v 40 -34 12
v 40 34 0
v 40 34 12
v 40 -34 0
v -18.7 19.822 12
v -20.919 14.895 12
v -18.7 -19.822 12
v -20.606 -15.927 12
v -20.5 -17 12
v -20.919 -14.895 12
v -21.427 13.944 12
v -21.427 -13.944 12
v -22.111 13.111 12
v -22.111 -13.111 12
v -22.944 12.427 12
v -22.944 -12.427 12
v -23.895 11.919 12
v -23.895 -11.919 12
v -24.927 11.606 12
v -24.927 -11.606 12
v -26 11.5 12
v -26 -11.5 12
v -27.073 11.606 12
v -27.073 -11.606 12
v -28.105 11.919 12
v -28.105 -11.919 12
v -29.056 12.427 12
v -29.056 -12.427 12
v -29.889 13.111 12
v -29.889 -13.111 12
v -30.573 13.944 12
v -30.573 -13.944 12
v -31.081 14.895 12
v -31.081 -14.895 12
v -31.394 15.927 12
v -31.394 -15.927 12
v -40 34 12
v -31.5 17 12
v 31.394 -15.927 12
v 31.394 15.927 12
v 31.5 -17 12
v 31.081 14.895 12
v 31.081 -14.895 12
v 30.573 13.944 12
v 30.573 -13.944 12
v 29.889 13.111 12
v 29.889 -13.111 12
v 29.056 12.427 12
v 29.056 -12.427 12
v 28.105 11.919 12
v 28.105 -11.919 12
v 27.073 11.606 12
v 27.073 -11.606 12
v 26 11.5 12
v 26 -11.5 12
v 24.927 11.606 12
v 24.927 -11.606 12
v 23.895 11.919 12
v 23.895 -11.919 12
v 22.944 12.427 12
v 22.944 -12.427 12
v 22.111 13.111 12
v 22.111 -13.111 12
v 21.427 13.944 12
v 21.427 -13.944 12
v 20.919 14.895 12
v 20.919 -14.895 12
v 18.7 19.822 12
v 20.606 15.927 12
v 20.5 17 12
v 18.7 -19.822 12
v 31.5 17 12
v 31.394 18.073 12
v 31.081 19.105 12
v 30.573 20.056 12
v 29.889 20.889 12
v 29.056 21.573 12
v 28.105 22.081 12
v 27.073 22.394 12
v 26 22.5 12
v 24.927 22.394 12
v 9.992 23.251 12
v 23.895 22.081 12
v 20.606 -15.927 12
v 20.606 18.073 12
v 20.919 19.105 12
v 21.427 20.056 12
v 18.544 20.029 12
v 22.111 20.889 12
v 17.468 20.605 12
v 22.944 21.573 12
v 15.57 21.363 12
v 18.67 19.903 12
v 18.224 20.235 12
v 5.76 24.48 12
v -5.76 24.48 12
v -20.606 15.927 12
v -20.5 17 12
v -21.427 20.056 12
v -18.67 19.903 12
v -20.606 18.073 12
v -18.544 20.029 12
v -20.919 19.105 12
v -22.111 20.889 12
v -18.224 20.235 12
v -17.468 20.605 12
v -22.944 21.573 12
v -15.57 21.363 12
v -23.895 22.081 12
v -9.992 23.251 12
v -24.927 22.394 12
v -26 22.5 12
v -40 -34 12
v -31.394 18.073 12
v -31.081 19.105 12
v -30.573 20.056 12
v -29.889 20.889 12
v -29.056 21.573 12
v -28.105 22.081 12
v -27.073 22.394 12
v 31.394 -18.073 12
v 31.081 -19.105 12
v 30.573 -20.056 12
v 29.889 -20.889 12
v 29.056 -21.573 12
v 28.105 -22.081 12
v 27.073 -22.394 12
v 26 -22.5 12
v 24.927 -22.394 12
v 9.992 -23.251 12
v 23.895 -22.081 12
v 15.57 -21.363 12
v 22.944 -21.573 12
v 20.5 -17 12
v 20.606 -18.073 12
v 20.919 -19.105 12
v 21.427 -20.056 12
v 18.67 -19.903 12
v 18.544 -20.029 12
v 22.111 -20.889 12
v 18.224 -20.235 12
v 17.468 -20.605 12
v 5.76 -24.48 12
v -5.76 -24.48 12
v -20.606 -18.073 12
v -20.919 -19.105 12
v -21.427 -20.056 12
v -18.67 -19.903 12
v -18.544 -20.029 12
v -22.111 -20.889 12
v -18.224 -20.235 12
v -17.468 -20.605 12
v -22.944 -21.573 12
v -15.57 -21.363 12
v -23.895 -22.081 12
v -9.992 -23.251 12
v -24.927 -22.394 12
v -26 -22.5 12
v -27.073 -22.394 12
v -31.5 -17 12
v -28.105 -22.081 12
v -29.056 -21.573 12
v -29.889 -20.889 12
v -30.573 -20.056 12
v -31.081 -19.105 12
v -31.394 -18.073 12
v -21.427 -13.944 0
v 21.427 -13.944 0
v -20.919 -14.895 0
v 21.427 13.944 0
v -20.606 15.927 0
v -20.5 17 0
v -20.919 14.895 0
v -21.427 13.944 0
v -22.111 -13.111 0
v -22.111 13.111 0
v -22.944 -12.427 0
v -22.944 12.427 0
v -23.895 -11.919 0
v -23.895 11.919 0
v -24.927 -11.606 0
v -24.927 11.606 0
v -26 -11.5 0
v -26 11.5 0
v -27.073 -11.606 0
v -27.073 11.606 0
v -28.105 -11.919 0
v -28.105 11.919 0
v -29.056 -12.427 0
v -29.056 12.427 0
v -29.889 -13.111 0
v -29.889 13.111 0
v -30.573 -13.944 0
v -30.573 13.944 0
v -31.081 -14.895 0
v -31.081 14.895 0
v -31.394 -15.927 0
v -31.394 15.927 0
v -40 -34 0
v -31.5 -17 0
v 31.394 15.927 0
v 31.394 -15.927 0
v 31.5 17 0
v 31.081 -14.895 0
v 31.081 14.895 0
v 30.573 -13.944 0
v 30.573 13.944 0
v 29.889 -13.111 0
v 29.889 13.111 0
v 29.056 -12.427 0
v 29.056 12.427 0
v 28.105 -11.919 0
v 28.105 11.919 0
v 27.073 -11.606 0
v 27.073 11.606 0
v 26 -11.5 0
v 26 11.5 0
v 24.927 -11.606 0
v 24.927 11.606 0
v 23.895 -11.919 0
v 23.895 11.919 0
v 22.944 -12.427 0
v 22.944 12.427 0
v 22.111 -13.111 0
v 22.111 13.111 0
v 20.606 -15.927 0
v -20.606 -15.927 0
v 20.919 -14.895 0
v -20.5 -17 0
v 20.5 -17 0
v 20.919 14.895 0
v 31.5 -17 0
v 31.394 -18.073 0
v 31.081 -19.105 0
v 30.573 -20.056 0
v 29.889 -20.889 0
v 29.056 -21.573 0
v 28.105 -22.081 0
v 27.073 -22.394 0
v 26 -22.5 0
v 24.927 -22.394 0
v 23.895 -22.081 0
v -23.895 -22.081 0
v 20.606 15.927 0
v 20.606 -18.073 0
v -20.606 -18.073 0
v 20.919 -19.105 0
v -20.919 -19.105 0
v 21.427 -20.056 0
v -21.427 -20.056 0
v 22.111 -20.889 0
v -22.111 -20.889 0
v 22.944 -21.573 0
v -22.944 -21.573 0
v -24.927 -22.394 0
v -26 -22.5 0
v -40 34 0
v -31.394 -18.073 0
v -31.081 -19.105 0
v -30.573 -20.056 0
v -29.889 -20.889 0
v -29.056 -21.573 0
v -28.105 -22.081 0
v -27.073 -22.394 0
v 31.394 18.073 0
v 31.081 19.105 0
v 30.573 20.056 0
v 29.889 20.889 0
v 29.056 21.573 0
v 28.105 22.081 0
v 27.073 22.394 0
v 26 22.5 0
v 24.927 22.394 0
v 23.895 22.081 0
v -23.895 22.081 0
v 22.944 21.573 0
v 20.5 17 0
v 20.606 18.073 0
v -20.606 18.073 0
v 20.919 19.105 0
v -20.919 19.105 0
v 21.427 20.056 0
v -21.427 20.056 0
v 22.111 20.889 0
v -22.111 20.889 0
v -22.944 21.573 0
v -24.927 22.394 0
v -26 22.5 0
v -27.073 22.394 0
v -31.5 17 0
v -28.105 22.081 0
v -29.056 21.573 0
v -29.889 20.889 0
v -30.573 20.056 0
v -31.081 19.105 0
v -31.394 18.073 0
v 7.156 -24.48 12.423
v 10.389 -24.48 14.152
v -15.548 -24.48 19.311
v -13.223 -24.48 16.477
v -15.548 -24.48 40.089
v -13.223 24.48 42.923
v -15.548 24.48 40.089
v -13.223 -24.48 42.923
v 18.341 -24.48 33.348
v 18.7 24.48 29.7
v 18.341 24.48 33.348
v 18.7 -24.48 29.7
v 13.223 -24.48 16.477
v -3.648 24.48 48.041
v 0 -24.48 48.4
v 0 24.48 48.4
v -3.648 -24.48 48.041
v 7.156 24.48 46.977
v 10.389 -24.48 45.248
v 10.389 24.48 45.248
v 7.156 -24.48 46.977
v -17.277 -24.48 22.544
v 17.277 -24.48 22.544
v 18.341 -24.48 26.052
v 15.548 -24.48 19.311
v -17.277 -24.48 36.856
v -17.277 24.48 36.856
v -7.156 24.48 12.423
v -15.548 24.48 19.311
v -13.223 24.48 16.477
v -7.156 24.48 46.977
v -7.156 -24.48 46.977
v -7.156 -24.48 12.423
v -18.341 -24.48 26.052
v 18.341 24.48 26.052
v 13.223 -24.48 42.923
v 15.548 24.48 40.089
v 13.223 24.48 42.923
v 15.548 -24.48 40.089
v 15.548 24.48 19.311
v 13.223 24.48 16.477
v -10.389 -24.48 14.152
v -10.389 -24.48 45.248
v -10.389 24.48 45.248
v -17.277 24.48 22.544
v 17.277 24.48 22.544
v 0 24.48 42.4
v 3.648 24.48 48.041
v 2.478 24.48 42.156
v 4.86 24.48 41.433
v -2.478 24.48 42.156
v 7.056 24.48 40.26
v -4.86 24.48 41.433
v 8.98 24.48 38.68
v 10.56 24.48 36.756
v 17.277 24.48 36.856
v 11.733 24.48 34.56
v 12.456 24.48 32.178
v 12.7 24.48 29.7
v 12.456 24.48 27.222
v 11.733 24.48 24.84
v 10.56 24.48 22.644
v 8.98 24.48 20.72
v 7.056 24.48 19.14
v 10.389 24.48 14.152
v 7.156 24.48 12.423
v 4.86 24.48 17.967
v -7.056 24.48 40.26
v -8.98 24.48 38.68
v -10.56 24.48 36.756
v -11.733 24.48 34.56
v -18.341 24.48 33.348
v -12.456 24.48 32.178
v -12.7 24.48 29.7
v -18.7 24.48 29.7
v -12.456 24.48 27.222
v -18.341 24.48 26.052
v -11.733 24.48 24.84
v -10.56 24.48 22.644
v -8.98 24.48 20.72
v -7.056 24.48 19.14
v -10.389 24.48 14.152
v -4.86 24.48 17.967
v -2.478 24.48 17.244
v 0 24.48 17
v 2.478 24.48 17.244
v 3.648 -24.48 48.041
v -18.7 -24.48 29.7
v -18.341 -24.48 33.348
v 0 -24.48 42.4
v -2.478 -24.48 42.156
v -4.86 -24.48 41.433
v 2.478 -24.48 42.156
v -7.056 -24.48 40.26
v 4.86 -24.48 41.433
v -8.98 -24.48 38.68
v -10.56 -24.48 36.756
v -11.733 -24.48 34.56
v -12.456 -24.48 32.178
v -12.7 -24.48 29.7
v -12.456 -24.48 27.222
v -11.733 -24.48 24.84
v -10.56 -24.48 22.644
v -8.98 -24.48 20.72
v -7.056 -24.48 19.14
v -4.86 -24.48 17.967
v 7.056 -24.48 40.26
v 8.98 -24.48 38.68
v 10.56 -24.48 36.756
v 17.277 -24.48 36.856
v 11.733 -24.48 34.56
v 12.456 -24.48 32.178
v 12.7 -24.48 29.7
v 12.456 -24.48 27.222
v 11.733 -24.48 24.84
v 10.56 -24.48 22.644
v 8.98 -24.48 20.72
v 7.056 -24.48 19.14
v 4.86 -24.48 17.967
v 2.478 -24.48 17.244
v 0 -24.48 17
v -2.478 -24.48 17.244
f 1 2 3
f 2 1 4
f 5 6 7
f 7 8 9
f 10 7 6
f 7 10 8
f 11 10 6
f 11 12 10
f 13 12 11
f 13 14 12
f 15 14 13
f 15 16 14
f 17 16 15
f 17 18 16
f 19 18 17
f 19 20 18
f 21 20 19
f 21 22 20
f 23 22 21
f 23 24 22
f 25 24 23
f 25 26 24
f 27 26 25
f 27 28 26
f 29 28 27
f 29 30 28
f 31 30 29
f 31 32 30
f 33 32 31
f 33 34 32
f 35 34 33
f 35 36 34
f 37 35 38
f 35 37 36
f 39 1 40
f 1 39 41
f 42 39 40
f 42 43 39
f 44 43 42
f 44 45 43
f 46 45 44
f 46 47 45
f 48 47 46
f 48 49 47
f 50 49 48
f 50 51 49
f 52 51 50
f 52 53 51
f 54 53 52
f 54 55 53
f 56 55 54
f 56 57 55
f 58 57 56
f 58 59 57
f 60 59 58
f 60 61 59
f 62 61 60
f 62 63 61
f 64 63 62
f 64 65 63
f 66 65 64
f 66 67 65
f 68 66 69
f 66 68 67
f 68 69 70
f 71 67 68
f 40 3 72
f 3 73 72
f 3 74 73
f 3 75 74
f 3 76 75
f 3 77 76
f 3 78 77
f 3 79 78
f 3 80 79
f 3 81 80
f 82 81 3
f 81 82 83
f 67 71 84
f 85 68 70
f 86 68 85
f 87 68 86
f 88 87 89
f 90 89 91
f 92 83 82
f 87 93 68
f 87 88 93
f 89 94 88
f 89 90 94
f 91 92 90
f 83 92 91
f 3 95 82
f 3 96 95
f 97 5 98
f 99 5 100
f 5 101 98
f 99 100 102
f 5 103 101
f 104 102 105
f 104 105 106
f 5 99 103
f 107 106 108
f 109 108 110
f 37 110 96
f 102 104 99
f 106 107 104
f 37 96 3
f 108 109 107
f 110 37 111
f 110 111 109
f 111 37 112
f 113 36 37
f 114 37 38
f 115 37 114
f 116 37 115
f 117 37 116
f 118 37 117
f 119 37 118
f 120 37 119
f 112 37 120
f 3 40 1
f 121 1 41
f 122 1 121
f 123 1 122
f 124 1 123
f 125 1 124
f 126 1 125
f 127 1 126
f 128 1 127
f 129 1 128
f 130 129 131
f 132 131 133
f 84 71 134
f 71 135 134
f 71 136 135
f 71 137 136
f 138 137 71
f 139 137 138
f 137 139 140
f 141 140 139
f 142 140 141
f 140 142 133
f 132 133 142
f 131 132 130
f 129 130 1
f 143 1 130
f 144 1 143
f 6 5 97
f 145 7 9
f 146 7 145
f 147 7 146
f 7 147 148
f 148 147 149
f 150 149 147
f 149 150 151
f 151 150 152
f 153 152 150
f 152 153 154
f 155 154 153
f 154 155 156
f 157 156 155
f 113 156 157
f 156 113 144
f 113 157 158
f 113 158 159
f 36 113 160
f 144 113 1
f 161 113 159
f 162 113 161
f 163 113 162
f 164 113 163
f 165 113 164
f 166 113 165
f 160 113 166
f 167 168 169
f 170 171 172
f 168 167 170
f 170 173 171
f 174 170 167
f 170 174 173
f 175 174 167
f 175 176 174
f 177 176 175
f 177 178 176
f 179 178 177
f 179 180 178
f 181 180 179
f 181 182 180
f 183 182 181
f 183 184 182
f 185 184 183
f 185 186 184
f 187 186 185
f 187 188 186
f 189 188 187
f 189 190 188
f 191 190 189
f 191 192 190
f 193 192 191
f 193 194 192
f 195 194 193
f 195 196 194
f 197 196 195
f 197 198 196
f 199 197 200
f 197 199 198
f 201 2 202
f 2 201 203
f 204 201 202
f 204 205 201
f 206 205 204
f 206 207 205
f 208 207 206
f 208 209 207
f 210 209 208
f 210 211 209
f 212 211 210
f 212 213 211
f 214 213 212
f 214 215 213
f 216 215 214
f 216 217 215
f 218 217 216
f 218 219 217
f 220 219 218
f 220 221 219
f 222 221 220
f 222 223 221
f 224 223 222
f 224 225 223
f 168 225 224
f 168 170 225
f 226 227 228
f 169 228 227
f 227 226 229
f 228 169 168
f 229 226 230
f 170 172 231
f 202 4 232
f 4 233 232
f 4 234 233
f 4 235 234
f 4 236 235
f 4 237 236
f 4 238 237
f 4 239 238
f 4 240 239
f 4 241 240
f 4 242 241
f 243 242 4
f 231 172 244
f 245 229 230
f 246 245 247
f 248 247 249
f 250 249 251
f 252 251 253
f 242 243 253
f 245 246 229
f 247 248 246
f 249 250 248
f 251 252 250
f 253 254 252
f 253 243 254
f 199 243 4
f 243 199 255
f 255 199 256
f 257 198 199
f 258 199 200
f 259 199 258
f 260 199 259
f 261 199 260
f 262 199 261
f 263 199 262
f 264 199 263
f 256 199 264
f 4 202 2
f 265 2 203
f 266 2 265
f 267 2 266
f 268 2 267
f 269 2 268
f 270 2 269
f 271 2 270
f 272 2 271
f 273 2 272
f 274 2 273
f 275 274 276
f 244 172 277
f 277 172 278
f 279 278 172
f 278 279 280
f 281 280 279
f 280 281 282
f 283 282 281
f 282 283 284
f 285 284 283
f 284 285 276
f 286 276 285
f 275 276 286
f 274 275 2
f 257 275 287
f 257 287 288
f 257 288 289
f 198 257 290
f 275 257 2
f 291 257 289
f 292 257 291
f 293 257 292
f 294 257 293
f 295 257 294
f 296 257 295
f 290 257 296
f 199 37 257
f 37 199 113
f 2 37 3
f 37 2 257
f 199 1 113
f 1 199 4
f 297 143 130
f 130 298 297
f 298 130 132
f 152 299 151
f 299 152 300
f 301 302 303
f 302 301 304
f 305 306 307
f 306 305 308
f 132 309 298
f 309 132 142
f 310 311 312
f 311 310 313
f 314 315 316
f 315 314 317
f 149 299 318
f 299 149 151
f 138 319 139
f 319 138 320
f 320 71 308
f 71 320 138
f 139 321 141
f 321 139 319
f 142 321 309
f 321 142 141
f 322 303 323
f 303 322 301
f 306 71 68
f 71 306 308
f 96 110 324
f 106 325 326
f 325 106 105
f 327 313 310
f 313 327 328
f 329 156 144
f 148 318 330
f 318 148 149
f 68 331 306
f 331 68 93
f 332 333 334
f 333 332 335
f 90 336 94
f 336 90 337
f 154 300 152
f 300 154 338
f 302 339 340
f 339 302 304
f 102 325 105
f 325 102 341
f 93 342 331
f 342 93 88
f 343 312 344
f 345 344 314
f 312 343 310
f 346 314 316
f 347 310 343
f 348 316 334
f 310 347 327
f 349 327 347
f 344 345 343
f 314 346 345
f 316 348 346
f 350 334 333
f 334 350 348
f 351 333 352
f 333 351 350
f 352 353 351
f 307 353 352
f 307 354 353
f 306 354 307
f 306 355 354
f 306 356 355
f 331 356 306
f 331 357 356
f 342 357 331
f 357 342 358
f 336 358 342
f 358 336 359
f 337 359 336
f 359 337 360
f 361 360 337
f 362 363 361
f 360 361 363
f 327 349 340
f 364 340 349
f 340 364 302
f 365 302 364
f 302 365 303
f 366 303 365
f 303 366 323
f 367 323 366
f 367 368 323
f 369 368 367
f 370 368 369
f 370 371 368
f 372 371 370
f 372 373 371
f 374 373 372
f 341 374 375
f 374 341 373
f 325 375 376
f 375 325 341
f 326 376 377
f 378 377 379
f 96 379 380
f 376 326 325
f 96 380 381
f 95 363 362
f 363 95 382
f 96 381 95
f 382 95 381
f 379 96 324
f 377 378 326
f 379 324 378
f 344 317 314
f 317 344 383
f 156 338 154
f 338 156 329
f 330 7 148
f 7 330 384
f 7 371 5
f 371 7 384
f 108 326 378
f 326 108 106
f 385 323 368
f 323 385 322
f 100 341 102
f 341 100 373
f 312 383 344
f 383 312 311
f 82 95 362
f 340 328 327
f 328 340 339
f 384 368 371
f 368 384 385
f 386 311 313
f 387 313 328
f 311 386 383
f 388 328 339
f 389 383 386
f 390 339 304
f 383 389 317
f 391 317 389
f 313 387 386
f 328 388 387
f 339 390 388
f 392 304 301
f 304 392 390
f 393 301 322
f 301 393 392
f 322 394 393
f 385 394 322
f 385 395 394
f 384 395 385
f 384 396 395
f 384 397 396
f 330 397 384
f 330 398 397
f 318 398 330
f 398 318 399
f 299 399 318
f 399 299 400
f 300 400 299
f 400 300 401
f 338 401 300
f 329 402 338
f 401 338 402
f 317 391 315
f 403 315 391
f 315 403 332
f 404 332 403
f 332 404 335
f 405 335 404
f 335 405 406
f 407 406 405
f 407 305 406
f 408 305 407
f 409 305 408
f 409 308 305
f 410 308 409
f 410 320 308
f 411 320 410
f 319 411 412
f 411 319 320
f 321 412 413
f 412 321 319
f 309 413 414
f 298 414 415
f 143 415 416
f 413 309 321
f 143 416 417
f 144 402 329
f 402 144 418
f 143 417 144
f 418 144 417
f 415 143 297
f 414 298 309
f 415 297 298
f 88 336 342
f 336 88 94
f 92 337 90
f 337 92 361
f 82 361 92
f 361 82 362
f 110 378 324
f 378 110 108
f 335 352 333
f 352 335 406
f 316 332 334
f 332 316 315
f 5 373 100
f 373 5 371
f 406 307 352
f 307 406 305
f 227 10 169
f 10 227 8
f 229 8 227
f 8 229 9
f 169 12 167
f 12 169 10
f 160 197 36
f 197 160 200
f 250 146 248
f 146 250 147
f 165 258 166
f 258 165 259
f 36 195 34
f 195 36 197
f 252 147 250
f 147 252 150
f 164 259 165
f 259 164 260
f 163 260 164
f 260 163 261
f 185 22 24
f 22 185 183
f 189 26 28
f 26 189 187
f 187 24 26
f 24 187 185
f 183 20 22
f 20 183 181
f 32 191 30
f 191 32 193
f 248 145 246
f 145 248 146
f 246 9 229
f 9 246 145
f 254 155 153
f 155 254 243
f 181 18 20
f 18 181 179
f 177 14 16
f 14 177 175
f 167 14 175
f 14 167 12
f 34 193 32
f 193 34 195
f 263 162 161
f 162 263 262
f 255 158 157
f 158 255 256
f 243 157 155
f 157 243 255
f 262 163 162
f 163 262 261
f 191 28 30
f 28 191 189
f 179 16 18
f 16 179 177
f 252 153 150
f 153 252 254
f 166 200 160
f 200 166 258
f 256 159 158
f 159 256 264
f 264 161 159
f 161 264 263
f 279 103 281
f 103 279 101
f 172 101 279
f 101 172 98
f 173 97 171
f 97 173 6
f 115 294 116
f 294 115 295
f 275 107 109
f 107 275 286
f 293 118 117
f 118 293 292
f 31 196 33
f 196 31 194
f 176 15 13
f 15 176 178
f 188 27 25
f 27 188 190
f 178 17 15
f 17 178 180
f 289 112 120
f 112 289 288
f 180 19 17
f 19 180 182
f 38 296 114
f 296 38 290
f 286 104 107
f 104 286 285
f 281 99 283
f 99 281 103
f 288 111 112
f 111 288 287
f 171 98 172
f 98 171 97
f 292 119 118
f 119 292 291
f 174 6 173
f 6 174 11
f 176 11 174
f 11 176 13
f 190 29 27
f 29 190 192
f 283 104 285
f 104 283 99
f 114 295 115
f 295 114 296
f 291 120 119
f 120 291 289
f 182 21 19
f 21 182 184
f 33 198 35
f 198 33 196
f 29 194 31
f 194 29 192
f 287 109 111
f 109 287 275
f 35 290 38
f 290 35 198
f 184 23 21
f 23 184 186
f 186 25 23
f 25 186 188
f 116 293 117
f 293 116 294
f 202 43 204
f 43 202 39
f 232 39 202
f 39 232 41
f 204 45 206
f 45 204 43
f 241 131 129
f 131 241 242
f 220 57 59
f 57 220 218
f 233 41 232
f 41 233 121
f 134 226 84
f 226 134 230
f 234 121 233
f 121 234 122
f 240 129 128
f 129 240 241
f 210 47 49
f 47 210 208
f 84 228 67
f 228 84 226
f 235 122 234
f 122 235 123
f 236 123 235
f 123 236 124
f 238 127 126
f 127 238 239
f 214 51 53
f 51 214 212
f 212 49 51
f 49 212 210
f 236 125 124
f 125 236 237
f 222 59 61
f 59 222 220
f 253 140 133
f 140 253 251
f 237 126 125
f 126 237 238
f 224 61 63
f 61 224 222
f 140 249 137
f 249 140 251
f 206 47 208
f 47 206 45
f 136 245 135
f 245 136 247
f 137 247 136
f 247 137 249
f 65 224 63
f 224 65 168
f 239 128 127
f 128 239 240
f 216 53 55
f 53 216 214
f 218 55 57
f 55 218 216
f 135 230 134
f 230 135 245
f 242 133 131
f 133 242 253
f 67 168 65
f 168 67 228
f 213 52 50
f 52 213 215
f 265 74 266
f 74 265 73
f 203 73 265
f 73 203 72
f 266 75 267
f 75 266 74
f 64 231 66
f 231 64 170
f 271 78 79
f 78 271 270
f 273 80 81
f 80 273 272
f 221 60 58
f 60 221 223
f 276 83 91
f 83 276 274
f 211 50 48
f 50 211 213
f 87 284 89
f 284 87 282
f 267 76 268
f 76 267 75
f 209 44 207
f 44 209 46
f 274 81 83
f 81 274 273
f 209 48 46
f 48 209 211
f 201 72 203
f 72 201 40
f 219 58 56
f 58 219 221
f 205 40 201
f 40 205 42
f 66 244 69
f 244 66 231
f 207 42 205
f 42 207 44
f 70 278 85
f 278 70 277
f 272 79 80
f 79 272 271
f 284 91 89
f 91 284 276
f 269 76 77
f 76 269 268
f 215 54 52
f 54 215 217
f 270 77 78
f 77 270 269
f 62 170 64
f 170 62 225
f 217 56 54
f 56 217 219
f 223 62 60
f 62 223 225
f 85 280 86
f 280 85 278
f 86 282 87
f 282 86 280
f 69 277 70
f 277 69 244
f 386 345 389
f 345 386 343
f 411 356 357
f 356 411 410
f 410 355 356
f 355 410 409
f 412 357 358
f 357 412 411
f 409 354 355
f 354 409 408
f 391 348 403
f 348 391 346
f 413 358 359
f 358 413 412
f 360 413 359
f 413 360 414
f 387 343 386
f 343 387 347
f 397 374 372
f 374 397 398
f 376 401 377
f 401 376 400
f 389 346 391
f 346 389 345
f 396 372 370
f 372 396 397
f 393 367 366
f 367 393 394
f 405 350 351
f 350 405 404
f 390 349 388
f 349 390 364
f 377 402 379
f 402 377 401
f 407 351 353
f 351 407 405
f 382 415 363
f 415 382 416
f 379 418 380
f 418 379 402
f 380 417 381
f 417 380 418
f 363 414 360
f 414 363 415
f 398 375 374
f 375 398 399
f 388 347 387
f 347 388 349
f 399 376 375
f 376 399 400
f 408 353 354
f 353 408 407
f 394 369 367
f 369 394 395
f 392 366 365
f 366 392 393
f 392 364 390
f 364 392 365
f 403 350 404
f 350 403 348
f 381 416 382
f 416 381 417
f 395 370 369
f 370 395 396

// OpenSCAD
$fn = 32;

// ----------------------------------------------------------------------
// Bearing block: 80 x 68 mm base, 25.4 mm bore at 29.7 mm
// ----------------------------------------------------------------------

// --- parameters (mm) ---
base_w = 80;              // base width
base_d = 68;              // base depth
base_t = 12;              // base thickness
bore_d = 25.4;            // shaft / bearing bore
house_r = 18.7;           // housing outer radius
house_len = 48.96;        // housing length along the shaft
foot_w = 37.4;            // foot width under the housing
foot_len = 38.96;         // foot length along the shaft
axis_z = 29.7;            // bore axis height above the base
holes_d = 11;             // mounting holes
hole_x = 26;              // mounting hole spacing

difference() {
  union() {
    /* base plate with its underside on z = 0 */
    translate([0, 0, base_t / 2]) cube([base_w, base_d, base_t], center = true);
    /* hull foot: a straight web blending into the round housing */
    hull() {
      translate([0, 0, base_t - 0.5]) cube([foot_w, foot_len, 1.6], center = true);
      translate([0, 0, axis_z]) rotate([-90, 0, 0]) cylinder(h = house_len, d = 2 * house_r, center = true);
    }
  }
  /* bore through the housing, 2.5 mm clear on both sides */
  translate([0, 0, axis_z]) rotate([-90, 0, 0]) cylinder(h = house_len + 5, d = bore_d, center = true);
  /* mounting holes through the base plate */
  for (hx = [-26, 26]) {
    for (hy = [-17, 17]) {
      translate([hx, hy, -2.5]) cylinder(h = base_t + 5, d = holes_d);
    }
  }
}
